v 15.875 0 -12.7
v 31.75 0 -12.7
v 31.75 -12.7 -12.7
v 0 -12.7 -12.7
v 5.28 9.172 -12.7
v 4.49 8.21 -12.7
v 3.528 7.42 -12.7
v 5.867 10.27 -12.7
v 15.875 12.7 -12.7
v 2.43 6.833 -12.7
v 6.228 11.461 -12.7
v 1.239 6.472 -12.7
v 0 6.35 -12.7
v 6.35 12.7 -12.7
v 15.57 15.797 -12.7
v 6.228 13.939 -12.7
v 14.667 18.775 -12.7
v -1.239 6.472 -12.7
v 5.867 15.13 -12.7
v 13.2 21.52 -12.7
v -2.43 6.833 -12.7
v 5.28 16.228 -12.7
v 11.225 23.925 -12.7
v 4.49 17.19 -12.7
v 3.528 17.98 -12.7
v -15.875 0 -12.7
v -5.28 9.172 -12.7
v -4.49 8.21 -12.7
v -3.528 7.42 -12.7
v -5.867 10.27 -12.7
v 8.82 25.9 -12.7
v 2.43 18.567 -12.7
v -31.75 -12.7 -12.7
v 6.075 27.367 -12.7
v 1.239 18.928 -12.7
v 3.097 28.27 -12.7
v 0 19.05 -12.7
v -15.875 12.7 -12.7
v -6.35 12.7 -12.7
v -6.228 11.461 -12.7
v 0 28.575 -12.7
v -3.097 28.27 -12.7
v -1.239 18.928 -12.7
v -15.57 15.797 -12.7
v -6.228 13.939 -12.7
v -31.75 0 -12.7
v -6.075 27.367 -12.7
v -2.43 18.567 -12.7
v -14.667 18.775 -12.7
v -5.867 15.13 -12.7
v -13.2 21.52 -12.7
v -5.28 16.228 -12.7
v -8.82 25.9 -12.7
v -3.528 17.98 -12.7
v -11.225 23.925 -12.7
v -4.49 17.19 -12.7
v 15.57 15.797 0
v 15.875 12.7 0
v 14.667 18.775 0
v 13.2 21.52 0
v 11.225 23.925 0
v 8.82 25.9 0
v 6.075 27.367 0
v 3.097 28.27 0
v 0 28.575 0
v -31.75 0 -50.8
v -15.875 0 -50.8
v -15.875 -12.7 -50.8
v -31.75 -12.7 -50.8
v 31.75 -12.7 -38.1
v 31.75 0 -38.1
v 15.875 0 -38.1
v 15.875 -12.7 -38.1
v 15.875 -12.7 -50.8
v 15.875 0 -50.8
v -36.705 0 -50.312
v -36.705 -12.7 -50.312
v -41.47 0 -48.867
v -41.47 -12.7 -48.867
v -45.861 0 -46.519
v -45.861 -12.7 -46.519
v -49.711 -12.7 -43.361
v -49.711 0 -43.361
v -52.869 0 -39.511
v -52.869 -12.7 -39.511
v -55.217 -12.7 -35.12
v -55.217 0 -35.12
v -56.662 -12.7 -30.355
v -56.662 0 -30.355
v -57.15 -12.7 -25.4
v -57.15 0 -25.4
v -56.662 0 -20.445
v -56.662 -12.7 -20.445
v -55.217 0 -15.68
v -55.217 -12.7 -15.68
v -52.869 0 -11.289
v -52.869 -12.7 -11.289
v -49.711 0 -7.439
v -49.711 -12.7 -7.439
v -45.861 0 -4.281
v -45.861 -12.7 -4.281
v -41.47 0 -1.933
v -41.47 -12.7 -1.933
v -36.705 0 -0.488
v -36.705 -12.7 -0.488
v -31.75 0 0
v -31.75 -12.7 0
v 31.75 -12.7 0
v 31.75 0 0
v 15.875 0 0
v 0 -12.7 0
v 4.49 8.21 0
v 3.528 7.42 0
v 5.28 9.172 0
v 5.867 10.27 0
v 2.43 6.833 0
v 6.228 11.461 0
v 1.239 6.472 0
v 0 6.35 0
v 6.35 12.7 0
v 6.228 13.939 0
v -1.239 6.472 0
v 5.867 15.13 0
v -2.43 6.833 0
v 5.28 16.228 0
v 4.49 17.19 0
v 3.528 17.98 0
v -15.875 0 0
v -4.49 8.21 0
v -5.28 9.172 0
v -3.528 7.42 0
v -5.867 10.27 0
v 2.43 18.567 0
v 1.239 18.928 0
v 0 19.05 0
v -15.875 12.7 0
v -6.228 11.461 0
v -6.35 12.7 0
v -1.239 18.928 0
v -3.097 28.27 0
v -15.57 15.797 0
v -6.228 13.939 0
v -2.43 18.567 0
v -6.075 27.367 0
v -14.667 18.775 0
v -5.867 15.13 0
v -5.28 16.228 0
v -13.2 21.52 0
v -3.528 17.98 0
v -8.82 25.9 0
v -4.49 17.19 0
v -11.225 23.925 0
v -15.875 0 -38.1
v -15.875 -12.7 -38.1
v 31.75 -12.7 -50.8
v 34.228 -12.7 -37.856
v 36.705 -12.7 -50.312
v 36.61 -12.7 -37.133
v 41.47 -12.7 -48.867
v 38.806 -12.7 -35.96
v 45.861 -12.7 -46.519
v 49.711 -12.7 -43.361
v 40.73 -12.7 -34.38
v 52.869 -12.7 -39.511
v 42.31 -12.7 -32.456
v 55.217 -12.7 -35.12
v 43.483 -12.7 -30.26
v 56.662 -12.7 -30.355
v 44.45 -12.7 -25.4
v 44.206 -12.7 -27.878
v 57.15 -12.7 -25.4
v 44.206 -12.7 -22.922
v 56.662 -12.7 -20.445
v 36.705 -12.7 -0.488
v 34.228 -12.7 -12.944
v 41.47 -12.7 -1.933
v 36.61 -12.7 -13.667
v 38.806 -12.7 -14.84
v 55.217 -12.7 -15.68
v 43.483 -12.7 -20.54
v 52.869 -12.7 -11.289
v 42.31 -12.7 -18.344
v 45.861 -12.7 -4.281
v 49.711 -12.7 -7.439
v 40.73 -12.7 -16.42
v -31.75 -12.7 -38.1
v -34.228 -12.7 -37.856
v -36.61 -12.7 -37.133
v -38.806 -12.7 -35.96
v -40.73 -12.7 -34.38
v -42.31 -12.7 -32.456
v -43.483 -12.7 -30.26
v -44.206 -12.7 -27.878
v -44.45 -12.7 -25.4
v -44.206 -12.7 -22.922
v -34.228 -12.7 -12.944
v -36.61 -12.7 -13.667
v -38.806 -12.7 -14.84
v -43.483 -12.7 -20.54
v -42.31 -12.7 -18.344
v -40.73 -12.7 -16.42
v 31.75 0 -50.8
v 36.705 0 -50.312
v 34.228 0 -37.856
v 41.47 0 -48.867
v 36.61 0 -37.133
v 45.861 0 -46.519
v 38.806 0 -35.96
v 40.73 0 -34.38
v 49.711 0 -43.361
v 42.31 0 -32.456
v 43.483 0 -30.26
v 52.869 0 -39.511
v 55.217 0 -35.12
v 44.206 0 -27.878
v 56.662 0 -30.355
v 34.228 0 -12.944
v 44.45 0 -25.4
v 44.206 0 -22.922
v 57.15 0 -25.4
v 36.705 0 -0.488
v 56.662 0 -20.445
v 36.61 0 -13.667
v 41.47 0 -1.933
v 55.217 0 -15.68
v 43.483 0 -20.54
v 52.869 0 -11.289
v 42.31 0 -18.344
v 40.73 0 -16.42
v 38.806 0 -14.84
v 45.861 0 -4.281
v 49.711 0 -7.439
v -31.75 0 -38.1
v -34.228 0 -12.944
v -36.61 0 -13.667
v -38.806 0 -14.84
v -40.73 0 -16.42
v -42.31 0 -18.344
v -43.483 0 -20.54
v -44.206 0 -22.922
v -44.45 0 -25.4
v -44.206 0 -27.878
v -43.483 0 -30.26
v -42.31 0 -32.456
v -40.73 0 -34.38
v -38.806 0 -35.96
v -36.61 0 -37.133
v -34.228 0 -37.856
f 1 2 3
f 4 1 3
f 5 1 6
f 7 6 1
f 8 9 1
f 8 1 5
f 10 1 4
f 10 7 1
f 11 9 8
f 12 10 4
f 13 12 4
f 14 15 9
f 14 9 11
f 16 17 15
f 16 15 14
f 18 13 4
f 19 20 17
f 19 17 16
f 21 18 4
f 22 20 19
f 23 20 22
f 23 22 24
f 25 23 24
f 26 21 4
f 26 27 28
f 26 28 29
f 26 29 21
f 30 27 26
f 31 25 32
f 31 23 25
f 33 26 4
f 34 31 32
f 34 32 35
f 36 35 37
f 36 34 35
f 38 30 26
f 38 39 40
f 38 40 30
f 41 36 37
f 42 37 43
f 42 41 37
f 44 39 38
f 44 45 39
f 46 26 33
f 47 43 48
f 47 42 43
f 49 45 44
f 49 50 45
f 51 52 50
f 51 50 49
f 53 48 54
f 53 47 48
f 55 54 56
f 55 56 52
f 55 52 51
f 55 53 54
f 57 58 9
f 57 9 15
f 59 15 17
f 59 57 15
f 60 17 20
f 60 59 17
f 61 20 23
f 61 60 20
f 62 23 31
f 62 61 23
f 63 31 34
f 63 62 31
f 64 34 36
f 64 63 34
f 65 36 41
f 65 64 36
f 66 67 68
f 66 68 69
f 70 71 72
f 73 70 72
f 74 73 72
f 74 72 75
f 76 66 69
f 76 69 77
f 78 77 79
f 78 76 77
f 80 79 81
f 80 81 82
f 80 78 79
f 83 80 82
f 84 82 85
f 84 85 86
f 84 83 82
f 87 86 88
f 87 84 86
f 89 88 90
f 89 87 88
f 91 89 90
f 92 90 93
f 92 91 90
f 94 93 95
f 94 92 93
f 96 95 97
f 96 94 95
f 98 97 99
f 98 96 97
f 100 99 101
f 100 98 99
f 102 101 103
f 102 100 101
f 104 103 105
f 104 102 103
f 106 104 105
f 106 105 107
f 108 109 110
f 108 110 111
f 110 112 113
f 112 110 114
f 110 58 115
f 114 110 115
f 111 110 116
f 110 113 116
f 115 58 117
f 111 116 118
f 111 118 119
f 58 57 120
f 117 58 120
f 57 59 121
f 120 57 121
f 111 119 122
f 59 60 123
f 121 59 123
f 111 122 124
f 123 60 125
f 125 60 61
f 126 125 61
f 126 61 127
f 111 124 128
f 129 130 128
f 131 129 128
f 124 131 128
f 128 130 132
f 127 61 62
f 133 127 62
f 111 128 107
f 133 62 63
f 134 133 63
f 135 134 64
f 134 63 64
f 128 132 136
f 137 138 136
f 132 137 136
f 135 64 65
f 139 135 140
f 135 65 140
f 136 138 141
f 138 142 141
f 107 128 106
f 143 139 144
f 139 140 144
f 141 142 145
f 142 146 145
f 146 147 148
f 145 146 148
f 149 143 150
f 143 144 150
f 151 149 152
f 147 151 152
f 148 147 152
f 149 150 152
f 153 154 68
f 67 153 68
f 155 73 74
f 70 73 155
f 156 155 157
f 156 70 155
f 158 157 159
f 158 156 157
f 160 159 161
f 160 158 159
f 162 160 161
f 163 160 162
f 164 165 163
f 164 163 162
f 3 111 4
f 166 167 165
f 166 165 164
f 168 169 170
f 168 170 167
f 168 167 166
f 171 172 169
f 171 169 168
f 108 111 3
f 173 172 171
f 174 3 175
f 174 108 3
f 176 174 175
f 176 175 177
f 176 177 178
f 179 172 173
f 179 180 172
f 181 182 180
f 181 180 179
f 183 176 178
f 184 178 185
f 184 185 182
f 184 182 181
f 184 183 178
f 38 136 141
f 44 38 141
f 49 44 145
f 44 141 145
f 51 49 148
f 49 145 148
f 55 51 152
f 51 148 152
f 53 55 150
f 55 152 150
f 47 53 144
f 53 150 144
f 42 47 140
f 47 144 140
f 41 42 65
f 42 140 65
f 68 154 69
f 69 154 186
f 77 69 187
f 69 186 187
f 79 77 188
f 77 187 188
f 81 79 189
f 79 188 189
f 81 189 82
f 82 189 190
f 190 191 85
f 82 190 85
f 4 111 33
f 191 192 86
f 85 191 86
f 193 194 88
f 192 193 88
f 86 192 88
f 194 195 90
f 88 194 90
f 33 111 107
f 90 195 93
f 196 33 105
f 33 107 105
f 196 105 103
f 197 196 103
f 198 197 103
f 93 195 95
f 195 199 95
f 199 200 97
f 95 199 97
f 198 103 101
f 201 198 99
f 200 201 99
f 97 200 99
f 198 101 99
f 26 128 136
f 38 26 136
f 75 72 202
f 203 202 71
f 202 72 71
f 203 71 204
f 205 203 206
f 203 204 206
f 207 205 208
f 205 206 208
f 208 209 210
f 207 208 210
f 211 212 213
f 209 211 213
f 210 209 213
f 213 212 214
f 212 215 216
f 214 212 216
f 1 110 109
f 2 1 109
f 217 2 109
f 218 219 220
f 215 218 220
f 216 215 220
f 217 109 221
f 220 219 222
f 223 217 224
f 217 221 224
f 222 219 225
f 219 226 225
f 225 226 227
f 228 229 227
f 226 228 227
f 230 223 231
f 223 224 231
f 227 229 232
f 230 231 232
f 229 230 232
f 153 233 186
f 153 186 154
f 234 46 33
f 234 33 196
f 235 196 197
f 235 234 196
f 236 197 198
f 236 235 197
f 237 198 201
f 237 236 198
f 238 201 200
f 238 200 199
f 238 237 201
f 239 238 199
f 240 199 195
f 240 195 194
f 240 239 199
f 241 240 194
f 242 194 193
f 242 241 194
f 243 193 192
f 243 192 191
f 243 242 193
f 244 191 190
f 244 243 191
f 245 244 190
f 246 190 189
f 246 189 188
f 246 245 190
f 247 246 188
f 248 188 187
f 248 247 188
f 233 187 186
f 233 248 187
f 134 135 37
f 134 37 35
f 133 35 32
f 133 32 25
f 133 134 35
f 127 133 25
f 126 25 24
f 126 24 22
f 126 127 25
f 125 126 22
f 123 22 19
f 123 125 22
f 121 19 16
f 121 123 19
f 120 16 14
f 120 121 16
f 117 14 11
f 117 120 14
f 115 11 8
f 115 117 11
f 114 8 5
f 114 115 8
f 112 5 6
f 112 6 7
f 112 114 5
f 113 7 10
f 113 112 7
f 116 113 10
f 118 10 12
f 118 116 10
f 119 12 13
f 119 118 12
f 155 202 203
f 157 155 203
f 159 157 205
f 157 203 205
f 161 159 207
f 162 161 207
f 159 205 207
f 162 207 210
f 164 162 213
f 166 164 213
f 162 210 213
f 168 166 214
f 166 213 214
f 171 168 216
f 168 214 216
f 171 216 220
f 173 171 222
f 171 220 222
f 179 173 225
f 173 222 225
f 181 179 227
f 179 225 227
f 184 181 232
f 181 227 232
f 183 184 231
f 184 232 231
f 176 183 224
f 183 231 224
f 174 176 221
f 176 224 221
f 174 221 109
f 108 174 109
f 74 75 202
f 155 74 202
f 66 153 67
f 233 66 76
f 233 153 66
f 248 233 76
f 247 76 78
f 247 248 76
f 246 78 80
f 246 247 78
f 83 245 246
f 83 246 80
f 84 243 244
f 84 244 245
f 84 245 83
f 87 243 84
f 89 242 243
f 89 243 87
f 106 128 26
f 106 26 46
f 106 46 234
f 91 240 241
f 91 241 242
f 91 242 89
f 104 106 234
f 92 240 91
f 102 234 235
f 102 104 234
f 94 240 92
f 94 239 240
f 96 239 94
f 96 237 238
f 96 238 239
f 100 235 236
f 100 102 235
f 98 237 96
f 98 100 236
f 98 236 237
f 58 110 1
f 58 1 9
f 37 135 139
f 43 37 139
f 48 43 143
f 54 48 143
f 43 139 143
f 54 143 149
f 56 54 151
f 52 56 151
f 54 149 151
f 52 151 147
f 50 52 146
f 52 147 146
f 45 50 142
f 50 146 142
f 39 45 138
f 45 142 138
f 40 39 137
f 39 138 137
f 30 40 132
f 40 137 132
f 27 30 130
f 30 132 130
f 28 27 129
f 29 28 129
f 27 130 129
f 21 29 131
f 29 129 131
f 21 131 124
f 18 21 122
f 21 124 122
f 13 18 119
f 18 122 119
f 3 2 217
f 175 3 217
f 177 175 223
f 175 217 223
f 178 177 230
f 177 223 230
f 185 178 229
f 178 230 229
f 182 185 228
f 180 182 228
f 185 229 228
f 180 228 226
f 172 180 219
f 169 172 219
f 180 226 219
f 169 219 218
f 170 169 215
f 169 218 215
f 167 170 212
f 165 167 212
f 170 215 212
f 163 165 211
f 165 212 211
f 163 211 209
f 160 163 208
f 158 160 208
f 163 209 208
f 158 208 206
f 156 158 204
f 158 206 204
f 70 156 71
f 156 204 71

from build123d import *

# Parameters (mm, degrees)
F1_DEPTH = 12.7
F3_DEPTH = 12.7


with BuildPart() as f1:
    # F0 (on Front) → F1 (new body)
    with BuildSketch(Plane.XZ):
        with BuildLine():
            Line((31.75, 0), (0, 0))
            Line((0, 0), (0, -12.7))
            Line((0, -12.7), (31.75, -12.7))
            ThreePointArc((31.75, -12.7), (44.45, -25.4), (31.75, -38.1))
            Line((31.75, -38.1), (15.875, -38.1))
            Line((15.875, -38.1), (15.875, -50.8))
            Line((15.875, -50.8), (31.75, -50.8))
            ThreePointArc((31.75, -50.8), (57.15, -25.4), (31.75, 0))
        make_face()
    extrude(amount=F1_DEPTH)

    # F2 (on face) → F3 (join, through all)
    with BuildSketch(Plane.XY):
        with BuildLine():
            Line((15.875, 0), (15.875, 12.7))
            ThreePointArc((15.875, 12.7), (11.22532, 23.92532), (0, 28.575))
            Line((0, 28.575), (0, 19.05))
            ThreePointArc((0, 19.05), (6.35, 12.7), (0, 6.35))
            Line((0, 6.35), (0, 0))
            Line((0, 0), (15.875, 0))
        make_face()
    extrude(amount=-F3_DEPTH)

    # F4: F1 across face


with BuildPart() as f1_1:
    add(f1.part)
    add(f1.part.mirror(Plane(origin=(0, -3.175, -6.35), x_dir=(0, -1, 0), z_dir=(-1, 0, 0))))


solid = f1_1.part
